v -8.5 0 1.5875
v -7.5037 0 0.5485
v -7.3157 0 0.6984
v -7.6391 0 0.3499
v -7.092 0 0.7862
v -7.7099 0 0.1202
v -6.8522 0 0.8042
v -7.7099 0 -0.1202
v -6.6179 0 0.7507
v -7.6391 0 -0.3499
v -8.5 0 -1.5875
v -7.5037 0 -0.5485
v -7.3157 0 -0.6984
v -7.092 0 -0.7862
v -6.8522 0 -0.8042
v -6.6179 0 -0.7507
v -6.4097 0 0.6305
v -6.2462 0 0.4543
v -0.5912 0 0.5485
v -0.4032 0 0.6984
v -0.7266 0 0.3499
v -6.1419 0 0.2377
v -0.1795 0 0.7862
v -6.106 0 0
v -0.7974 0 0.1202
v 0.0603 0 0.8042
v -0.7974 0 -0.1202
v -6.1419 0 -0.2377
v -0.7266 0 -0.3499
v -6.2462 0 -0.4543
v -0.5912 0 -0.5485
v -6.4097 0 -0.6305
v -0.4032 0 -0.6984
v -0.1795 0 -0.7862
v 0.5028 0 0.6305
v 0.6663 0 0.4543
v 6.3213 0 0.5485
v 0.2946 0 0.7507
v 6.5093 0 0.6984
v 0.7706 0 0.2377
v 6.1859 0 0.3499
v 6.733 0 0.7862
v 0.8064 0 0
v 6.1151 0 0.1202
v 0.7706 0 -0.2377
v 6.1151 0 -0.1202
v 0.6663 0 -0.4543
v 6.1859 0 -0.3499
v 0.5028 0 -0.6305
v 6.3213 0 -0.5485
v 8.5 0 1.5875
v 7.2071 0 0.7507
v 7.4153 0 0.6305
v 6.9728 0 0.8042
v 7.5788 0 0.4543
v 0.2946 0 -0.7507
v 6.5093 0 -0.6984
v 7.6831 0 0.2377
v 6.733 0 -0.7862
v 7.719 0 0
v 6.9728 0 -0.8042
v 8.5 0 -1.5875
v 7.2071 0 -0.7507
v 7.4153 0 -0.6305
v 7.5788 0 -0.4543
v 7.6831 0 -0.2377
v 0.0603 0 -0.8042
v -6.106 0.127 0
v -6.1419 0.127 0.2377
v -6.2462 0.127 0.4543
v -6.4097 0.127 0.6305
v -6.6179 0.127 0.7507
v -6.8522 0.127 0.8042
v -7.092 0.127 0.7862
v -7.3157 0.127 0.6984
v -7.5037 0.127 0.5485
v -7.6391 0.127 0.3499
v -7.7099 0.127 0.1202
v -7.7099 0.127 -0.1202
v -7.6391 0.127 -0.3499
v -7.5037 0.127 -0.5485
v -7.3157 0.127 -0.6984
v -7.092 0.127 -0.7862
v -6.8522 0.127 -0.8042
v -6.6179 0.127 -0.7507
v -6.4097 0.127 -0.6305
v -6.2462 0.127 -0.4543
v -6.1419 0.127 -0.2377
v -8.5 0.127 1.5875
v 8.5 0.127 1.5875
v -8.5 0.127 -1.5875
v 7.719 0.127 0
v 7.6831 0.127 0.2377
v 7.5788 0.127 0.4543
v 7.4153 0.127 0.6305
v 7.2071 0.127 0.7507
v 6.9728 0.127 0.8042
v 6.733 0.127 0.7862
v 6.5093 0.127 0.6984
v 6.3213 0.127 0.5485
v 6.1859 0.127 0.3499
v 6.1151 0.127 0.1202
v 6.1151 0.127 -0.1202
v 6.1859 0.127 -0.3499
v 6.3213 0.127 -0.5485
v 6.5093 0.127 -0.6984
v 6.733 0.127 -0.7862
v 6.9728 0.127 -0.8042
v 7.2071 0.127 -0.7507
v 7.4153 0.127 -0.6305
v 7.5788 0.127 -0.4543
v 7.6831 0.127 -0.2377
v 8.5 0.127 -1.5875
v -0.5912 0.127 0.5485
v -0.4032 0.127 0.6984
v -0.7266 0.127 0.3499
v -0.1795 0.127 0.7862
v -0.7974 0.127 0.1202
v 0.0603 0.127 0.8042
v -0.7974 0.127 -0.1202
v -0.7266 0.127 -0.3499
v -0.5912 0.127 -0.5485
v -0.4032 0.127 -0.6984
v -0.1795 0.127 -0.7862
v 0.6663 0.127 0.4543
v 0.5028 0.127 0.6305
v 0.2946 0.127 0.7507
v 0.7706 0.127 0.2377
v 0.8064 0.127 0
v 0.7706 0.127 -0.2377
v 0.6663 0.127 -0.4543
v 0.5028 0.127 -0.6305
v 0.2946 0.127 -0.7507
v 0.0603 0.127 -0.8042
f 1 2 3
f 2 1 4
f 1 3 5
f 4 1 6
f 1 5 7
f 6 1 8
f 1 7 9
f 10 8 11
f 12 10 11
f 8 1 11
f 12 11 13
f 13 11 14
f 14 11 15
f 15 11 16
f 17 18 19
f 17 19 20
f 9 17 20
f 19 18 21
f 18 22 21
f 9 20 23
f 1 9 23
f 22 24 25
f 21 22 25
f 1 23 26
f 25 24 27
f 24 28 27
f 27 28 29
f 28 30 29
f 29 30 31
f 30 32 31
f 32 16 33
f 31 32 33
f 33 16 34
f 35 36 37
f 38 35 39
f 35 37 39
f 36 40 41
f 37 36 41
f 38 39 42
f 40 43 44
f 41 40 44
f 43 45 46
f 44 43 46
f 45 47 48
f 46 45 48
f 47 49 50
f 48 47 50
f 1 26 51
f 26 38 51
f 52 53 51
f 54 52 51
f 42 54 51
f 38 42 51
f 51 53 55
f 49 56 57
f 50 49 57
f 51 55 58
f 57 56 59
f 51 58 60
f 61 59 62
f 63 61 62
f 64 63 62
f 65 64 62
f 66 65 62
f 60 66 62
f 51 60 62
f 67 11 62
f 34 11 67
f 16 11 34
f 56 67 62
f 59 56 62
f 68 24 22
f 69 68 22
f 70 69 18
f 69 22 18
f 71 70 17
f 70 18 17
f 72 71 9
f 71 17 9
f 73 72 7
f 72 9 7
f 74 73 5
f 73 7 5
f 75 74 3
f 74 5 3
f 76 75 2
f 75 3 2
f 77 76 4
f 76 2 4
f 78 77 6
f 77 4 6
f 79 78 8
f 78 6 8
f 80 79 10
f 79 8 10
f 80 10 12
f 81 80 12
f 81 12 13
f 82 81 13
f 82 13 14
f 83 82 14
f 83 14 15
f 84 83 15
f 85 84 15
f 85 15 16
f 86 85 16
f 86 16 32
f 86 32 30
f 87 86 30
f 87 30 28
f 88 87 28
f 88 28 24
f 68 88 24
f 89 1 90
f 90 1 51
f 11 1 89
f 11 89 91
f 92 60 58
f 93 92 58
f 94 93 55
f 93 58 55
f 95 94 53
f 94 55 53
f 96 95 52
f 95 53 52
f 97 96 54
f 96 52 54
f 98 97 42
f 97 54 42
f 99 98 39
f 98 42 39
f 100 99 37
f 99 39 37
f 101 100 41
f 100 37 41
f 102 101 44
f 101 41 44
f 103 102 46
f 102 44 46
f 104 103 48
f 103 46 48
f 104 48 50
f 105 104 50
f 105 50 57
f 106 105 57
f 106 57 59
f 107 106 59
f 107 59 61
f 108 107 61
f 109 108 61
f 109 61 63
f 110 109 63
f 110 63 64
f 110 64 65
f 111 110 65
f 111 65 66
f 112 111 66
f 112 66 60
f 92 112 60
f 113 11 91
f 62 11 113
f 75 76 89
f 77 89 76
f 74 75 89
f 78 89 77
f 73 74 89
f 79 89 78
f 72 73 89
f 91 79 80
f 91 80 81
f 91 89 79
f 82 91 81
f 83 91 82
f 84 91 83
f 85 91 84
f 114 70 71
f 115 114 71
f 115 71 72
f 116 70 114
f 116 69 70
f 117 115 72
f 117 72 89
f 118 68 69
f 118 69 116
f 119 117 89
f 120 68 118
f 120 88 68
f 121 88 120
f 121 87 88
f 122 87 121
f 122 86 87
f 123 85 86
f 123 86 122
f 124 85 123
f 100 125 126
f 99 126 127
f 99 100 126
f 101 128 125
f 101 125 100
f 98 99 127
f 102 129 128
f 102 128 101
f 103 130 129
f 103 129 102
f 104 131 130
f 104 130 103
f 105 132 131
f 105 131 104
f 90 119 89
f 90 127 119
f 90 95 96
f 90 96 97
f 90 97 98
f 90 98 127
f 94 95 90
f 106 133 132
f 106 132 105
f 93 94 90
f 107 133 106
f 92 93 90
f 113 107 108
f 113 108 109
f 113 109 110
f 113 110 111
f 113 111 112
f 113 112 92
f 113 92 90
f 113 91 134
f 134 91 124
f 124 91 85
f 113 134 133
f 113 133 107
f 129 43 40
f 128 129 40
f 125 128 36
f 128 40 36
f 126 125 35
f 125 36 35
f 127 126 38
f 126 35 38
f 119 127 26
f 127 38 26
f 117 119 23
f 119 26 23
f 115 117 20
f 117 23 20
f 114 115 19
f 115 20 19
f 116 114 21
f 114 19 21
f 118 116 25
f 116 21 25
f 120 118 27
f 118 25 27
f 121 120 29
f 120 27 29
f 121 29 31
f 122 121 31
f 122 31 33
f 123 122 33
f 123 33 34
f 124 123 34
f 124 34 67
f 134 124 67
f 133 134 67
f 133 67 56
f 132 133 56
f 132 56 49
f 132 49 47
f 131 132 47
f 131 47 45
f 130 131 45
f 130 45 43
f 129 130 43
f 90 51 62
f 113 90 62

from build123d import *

# Parameters (mm, degrees)
SKETCH1_W                 = 17
SKETCH1_H                 = 3.175
BOSS_EXTRUDE1_DEPTH       = 0.127
F_0_CLEARANCE_HOLE1_D     = 1.6129
F_0_CLEARANCE_HOLE1_DEPTH = 4.826
F_0_CLEARANCE_HOLE1_TIP   = 0.484564046


with BuildPart() as part:
    # Sketch1 → Boss-Extrude1 (new body)
    with BuildSketch(Plane(origin=(0, 0, 0), x_dir=(1, 0, 0), z_dir=(0, 1, 0))):
        Rectangle(SKETCH1_W, SKETCH1_H)
    extrude(amount=BOSS_EXTRUDE1_DEPTH)

    # #0 Clearance Hole1
    with Locations(Plane(origin=(0, 0.127, 0), x_dir=(-1, 0, 0), z_dir=(0, 1, 0))):
        with Locations((0, 0), (-6.9125, 0), (6.9125, 0)):
            Hole(F_0_CLEARANCE_HOLE1_D / 2, depth=F_0_CLEARANCE_HOLE1_DEPTH)
            with Locations((0, 0, -(F_0_CLEARANCE_HOLE1_DEPTH + F_0_CLEARANCE_HOLE1_TIP / 2))):  # 118° drill point
                Cone(0, F_0_CLEARANCE_HOLE1_D / 2, F_0_CLEARANCE_HOLE1_TIP, mode=Mode.SUBTRACT)


solid = part.part
